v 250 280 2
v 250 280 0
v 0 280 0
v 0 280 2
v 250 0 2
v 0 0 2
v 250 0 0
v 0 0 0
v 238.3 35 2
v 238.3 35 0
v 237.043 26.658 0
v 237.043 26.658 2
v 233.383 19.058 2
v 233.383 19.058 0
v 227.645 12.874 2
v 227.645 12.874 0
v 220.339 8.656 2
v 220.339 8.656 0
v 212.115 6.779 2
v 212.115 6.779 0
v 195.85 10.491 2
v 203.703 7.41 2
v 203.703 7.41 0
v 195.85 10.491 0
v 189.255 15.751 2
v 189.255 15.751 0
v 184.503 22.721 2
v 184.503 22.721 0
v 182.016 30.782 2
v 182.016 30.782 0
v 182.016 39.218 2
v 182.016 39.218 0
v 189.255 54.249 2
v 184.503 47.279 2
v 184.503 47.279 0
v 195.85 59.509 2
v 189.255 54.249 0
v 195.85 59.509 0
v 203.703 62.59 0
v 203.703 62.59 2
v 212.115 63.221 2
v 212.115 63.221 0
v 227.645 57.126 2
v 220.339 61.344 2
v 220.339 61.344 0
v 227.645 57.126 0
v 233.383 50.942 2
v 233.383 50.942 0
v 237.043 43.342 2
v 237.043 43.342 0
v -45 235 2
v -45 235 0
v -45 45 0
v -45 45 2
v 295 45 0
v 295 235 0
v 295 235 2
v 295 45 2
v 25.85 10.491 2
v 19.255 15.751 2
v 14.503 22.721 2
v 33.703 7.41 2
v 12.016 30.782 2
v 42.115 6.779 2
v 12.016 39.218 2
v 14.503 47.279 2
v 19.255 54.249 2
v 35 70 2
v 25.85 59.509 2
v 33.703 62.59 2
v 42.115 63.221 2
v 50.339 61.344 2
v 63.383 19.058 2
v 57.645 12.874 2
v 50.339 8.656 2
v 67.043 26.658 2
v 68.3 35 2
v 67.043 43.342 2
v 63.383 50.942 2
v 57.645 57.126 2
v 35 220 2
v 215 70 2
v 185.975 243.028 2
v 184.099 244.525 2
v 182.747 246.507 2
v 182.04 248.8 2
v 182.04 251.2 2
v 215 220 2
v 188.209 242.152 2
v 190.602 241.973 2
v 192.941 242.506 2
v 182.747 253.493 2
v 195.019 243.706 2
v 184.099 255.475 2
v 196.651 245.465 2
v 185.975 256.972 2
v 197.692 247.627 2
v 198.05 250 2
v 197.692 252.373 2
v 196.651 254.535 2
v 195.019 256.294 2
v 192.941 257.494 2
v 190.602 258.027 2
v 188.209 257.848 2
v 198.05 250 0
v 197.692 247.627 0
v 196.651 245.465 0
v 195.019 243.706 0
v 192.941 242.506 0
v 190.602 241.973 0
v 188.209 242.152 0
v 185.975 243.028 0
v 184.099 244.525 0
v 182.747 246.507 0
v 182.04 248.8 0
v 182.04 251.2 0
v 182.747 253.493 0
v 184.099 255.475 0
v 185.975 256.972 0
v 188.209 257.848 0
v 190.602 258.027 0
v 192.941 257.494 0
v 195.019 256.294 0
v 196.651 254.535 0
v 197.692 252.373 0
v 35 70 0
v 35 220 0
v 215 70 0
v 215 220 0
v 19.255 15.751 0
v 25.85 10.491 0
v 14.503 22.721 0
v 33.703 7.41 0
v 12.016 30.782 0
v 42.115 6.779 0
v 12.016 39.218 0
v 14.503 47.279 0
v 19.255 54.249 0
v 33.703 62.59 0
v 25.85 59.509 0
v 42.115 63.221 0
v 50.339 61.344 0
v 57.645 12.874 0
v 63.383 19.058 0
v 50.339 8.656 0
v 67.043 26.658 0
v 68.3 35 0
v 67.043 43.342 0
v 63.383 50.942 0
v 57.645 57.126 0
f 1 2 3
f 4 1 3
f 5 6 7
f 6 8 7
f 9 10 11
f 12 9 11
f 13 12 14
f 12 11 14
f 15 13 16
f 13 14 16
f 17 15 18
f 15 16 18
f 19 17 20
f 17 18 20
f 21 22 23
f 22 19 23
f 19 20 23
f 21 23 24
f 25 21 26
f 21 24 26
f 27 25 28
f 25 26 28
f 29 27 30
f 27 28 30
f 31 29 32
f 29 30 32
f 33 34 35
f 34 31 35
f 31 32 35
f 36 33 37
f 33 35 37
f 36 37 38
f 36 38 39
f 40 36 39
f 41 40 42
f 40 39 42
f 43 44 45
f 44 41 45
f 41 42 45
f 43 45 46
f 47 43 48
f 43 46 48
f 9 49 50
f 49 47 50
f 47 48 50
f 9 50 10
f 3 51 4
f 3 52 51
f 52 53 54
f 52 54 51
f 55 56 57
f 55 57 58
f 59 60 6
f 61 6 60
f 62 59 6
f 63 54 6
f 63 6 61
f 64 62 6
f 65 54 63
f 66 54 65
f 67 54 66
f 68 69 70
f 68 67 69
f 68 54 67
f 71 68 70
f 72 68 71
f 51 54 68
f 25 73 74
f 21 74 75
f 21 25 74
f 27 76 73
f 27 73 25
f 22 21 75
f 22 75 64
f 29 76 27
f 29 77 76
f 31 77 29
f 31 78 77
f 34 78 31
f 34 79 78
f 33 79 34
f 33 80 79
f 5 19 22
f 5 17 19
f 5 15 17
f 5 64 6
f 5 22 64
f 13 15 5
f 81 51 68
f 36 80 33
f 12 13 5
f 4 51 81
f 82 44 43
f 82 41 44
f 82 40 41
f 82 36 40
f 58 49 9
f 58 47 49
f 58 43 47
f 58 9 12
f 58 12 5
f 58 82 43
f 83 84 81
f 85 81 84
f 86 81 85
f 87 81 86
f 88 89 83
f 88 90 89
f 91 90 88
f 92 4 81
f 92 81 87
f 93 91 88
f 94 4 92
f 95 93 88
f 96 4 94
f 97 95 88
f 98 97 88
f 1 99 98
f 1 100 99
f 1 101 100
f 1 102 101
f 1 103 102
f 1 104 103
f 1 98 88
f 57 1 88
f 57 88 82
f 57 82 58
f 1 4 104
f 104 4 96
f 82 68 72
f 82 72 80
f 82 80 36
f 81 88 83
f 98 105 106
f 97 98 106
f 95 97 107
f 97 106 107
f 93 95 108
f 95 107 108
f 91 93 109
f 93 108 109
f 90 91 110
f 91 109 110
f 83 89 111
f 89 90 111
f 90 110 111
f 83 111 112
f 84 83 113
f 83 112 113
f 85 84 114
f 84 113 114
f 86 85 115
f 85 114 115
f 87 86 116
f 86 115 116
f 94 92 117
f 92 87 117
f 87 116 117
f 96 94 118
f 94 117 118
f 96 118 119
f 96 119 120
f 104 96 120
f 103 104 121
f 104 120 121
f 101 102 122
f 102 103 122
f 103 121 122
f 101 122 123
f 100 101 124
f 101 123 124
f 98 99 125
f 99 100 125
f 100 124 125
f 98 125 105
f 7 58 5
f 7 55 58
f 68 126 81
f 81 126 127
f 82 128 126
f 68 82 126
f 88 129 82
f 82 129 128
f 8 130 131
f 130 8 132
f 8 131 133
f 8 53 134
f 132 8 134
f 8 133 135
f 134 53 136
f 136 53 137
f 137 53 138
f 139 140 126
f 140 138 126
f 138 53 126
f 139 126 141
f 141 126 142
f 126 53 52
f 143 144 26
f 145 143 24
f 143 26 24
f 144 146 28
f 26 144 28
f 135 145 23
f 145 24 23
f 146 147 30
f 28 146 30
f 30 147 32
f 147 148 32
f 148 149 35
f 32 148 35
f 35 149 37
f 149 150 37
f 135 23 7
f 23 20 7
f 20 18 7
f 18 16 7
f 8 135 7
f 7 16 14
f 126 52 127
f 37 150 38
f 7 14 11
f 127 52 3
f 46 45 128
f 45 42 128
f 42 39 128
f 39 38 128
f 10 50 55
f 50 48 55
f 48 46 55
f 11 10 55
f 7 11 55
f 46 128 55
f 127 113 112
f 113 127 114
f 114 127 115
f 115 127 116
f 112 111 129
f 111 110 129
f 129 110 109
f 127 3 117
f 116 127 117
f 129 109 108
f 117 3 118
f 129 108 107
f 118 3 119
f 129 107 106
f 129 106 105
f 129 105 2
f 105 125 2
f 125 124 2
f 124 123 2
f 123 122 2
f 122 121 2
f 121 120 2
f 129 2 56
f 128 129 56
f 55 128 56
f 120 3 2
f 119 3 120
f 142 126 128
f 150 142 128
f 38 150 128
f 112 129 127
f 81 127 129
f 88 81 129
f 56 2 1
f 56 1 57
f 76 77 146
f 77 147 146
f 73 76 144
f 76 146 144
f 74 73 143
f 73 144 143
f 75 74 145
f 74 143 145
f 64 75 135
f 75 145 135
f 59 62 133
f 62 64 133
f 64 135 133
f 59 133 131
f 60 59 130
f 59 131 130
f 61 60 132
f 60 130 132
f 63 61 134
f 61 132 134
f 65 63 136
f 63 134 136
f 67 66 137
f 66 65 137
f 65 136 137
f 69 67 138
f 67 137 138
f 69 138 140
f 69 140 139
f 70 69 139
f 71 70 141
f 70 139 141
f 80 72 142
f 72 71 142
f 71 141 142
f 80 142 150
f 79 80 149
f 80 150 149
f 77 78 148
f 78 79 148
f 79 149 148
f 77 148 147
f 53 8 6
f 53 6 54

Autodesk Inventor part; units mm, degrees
ref_plane "YZ Plane" through (0, 0, 0) normal (1, 0, 0) x (0, 1, 0)
ref_plane "XZ Plane" through (0, 0, 0) normal (0, 1, 0) x (-1, 0, 0)
ref_plane "XY Plane" through (0, 0, 0) normal (0, 0, 1) x (1, 0, 0)
sketch "Эскиз1" plane through (0, 0, 0) normal (0, 0, 1) x (1, 0, 0)
  line L0 (0, 0) -> (250, 0)
  line L1 (250, 0) -> (250, 280)
  line L2 (250, 280) -> (0, 280)
  line L3 (0, 280) -> (0, 0)
  line L4 (250, 280) -> (295, 235)
  line L5 (295, 235) -> (295, 45)
  line L6 (295, 45) -> (250, 0)
  line L7 (0, 0) -> (-45, 45)
  line L8 (-45, 45) -> (-45, 235)
  line L9 (-45, 235) -> (0, 280)
  line L10 (35, 220) -> (215, 220)
  line L11 (215, 220) -> (215, 70)
  line L12 (215, 70) -> (35, 70)
  line L13 (35, 70) -> (35, 220)
  circle A0 centre (40, 35) radius 28.3
  circle A1 centre (210, 35) radius 28.3
  line L14 (125, 280) -> (125, 0) construction
  line L15 (40, 35) -> (210, 35) construction
  circle A2 centre (190, 250) radius 8.05
  point P0 (125, 220)
  point P1 (125, 35)
  dimension "d0" = 45
  dimension "d1" = 280
  dimension "d2" = 250
  dimension "d4" = 45
  dimension "d5" = 70
  dimension "d6" = 150
  dimension "d7" = 180
  dimension "d8" = 56.6
  dimension "d9" = 35
  dimension "d11" = 170
  dimension "d14" = 16.1
  dimension "d15" = 30
  dimension "d16" = 60
extrude "Выдавливание1" add sketch "Эскиз1" along normal blind 2
properties part number "face"
